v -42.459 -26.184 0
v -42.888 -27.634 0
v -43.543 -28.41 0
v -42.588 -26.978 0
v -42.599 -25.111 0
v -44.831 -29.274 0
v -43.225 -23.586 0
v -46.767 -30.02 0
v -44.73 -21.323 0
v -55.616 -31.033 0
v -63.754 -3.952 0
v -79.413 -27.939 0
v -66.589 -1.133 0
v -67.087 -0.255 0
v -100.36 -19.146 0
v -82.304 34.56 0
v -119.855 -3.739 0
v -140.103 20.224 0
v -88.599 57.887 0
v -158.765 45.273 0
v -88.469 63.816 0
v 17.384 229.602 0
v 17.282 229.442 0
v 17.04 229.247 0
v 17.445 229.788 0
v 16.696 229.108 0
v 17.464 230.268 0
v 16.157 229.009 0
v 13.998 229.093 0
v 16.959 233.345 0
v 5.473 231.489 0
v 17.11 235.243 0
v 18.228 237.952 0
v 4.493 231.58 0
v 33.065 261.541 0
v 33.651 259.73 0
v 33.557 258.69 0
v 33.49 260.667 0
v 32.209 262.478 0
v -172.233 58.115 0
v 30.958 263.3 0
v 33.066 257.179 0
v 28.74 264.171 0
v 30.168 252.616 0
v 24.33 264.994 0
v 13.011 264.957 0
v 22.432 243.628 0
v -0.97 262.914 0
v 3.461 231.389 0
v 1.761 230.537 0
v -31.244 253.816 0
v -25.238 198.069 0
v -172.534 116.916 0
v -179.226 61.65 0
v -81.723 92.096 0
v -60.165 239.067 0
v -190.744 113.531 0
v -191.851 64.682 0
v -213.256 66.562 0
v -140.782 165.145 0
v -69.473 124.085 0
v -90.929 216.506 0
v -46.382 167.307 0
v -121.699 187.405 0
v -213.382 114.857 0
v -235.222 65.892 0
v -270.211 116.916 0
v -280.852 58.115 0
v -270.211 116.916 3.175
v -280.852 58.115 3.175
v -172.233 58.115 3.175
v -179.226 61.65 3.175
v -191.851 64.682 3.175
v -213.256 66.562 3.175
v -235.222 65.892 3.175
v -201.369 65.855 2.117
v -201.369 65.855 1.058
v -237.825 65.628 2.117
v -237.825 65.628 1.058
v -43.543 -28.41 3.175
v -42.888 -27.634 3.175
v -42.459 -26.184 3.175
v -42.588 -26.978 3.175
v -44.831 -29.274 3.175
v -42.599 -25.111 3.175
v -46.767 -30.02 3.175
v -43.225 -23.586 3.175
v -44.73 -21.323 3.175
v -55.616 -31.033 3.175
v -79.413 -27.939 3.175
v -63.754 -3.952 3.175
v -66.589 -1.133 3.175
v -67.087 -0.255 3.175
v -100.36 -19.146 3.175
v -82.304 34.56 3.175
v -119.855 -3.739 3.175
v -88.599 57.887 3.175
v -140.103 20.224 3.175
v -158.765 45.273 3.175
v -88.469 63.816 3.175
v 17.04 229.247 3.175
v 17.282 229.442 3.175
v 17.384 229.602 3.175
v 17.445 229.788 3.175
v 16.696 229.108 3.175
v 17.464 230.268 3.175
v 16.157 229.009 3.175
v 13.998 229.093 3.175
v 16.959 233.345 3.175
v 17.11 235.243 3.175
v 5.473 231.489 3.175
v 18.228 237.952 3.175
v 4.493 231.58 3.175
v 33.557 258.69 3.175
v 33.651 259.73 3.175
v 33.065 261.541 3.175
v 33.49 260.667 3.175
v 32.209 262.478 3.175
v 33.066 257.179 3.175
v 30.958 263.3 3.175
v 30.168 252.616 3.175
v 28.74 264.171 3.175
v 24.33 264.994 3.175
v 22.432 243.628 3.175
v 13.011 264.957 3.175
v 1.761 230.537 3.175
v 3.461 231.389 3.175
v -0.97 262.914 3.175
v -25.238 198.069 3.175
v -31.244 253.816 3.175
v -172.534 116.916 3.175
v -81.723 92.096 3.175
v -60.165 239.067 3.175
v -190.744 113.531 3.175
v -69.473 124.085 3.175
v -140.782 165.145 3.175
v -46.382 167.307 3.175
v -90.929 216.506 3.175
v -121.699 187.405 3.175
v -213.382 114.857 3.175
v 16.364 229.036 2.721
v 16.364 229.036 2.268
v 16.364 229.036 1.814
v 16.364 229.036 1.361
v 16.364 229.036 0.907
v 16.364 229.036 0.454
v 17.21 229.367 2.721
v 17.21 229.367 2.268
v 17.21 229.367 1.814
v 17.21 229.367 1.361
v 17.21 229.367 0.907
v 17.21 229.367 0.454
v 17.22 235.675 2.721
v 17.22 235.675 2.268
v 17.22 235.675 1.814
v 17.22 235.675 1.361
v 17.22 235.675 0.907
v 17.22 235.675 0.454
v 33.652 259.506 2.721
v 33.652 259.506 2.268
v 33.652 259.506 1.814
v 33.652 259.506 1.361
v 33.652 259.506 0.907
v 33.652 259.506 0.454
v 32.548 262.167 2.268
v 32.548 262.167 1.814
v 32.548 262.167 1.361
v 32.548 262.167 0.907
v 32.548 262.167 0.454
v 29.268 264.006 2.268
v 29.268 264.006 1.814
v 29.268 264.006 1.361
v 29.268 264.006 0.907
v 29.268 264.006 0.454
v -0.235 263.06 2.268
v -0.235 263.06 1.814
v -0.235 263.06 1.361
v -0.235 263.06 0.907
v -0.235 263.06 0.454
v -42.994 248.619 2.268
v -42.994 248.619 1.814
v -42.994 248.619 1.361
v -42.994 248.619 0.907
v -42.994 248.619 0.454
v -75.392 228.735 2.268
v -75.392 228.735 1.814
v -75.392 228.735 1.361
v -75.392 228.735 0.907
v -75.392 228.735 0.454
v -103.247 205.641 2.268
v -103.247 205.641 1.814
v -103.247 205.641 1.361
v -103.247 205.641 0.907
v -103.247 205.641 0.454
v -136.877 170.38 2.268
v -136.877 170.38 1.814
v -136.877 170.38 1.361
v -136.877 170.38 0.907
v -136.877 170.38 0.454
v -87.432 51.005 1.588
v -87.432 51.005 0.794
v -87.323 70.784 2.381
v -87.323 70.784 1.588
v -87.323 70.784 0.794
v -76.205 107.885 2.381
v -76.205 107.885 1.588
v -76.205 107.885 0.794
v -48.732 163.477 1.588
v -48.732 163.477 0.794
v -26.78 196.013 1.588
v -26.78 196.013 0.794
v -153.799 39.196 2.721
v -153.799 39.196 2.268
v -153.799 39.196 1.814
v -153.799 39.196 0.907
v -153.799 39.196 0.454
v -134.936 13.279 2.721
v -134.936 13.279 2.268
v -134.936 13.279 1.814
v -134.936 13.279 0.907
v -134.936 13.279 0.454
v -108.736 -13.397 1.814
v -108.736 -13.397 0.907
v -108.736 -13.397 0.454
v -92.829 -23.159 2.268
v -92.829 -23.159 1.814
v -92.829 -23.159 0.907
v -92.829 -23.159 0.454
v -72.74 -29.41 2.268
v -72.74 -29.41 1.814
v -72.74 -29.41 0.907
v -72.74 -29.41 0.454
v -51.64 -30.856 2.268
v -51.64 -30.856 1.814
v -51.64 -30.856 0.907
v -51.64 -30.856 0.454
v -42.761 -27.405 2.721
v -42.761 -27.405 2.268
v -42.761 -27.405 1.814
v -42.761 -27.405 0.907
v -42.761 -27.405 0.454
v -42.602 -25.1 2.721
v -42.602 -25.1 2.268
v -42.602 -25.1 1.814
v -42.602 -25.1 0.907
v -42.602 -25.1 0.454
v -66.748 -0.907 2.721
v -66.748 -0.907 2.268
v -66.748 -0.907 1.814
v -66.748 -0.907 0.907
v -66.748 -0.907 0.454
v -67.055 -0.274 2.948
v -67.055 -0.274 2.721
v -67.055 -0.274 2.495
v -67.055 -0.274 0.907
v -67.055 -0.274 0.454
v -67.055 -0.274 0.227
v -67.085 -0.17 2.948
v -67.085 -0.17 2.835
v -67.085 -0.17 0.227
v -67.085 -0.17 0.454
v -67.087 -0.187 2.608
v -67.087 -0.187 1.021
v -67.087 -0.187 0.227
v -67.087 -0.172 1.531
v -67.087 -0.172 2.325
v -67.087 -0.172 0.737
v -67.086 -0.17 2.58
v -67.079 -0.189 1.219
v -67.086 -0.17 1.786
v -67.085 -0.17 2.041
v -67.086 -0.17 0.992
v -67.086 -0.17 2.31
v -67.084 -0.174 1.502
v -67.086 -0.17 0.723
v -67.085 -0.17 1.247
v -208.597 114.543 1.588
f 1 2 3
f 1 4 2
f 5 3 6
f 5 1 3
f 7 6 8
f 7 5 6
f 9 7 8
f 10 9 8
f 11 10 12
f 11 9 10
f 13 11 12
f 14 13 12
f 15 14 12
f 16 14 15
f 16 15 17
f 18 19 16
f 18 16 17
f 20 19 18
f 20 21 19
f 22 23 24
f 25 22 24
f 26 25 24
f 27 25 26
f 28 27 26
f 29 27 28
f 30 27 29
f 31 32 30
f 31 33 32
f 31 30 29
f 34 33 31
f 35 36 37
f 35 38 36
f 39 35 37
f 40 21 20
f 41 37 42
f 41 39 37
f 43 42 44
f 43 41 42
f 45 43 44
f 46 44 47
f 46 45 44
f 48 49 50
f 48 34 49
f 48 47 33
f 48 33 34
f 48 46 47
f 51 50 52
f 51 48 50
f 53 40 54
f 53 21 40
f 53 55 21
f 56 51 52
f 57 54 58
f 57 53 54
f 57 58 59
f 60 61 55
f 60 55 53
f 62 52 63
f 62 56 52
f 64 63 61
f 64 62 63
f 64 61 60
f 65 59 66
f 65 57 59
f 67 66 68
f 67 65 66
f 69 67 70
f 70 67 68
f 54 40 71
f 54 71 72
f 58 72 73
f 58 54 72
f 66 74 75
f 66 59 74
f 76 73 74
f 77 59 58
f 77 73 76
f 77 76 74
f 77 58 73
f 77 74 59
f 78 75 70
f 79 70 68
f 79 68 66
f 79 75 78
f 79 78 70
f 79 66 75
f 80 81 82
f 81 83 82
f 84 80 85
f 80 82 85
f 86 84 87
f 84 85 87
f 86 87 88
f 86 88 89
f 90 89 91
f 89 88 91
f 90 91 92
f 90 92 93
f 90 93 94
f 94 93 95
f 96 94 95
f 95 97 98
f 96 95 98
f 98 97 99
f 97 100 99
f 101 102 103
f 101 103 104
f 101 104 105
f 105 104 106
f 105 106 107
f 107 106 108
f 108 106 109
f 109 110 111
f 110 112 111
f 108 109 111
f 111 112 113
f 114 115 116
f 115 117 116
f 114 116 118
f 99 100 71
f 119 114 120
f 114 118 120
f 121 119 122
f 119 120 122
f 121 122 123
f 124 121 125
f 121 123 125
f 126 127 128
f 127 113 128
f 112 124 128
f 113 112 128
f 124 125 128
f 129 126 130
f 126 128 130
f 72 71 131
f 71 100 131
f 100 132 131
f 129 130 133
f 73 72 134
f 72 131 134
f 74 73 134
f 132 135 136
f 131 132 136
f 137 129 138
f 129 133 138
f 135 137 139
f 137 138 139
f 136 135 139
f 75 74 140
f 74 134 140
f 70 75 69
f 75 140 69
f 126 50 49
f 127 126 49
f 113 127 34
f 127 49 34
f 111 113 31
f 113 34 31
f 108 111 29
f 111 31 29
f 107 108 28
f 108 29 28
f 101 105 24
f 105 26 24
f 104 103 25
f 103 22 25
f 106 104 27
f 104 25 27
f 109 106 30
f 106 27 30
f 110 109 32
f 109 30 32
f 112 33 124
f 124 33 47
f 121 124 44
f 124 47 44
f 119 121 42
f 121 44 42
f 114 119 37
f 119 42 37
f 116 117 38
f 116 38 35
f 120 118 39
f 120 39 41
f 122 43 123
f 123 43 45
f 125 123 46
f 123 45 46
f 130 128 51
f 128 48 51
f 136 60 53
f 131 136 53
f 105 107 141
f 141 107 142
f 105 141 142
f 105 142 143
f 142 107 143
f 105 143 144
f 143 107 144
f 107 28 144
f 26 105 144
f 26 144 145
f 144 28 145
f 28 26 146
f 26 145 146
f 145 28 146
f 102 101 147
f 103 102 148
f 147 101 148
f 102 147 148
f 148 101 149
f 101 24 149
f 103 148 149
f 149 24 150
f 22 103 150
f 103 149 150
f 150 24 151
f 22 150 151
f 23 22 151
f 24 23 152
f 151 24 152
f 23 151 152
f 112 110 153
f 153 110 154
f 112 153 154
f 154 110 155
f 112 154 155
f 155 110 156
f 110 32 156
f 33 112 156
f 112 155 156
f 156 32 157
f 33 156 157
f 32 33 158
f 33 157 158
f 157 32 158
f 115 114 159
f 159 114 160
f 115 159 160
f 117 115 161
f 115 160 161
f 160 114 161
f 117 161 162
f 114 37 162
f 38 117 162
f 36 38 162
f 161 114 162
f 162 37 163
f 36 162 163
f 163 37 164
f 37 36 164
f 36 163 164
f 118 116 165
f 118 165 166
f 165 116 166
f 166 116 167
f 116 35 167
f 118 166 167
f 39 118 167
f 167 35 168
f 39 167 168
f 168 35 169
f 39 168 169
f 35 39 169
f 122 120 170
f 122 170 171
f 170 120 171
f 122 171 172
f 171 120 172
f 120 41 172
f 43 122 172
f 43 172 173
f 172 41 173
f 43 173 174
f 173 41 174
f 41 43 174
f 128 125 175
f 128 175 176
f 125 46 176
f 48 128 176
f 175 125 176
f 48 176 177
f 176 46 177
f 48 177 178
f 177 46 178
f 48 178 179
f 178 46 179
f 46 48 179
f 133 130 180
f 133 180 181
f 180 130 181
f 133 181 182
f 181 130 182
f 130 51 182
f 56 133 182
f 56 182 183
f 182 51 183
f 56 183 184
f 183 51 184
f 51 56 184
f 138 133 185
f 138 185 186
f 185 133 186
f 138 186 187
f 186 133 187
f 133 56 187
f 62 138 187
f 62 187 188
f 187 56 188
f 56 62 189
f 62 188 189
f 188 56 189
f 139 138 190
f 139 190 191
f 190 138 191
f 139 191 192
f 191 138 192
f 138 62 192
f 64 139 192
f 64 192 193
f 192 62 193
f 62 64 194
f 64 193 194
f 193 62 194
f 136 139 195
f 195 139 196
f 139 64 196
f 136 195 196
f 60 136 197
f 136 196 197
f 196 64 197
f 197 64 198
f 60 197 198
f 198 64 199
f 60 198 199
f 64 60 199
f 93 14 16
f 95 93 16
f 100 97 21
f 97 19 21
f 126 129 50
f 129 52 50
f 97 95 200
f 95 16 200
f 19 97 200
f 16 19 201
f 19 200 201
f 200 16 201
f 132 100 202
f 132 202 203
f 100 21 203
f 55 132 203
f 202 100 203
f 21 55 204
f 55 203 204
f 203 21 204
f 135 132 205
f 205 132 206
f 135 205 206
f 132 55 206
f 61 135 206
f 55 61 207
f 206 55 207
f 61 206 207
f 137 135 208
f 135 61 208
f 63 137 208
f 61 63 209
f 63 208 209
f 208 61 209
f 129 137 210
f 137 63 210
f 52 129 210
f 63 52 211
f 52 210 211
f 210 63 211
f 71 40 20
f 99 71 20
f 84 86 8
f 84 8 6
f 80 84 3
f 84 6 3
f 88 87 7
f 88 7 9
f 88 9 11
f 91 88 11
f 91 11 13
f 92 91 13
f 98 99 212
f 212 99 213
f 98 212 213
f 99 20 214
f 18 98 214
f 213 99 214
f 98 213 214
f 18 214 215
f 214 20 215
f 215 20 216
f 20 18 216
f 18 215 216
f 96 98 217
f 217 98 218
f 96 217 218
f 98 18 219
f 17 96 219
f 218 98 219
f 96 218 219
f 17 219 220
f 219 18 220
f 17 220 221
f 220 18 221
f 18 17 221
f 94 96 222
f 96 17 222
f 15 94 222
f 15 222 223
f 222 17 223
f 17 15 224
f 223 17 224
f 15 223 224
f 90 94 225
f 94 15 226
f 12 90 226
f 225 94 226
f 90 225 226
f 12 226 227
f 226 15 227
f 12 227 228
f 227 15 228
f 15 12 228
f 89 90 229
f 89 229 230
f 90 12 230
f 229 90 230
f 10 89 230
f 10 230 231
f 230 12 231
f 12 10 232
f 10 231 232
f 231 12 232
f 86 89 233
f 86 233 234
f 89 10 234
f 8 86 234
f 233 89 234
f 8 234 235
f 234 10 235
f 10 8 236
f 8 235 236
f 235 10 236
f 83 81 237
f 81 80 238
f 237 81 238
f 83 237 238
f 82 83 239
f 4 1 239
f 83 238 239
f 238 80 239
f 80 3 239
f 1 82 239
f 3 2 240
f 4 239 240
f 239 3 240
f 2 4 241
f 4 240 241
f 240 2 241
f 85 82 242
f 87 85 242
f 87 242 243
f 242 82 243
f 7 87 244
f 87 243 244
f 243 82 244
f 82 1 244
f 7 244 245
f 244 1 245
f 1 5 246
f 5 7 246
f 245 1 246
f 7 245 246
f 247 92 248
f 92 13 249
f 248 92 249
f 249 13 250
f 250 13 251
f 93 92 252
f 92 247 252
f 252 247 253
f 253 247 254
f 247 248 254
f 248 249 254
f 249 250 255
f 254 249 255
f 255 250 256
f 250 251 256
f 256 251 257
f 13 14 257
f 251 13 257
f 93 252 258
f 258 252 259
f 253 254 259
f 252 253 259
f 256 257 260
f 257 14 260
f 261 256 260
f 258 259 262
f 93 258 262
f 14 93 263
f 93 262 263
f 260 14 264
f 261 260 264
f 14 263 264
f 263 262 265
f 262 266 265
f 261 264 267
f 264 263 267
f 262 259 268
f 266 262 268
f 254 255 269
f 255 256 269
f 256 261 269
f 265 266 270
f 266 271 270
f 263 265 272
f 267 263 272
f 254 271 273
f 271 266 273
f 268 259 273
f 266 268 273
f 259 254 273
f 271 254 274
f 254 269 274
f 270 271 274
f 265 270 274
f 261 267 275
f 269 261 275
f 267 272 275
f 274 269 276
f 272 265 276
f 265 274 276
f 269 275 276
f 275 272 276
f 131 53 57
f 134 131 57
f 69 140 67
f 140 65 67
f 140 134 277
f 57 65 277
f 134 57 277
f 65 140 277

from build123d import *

# Parameters (mm, degrees)
F1_DEPTH = 3.175


with BuildPart() as f1:
    # F0 (on Top) → F1 (new body)
    with BuildSketch(Plane.XY):
        with BuildLine():
            add(Edge.make_bspline(
                [(-172.2328667043, 58.114699061), (-178.1991780072, 62.5826207553), (-202.4796362473, 67.2126055062), (-240.970937826, 66.6028247051), (-259.3255736371, 61.8181466399), (-280.8515687991, 58.114699061)],
                knots=[0, 0, 0, 0, 0.3027206265, 0.6356225974, 1, 1, 1, 1], degree=3))
            add(Edge.make_bspline(
                [(-172.2328667043, 58.114699061), (-167.7932428049, 55.103638933), (-153.8662998203, 41.1431396594), (-135.8069266298, 12.4939209918), (-110.0012521127, -14.9557776444), (-78.8693403249, -31.6914411152), (-23.4339486691, -32.3119024273), (-67.2976555796, -2.7103102349), (-67.0868525894, 0), (-67.0868525894, -0.2549805823)],
                knots=[0, 0, 0, 0, 0.1360657028, 0.3037302143, 0.4742693474, 0.653482802, 0.809369367, 0.9757911433, 1, 1, 1, 1], degree=3))
            add(Edge.make_bspline(
                [(-67.0868525894, -0.2549805823), (-69.2125904029, 3.256175837), (-74.9921898873, 14.4848800684), (-89.27520538, 52.310380297), (-88.7591205811, 74.5924149335), (-62.9272192884, 159.5779075452), (1.7608600929, 230.5372072262)],
                knots=[0, 0, 0, 0, 0.1439204339, 0.3645296562, 0.5199668986, 1, 1, 1, 1], degree=3))
            add(Edge.make_bspline(
                [(1.7608600929, 230.5372072262), (4.560167842, 232.3477854591), (6.9918636567, 230.3656272234), (20.2924394563, 227.4759853141), (12.3864605446, 237.3715301092), (57.8638928697, 271.815718132), (-57.3918104099, 261.8348224849), (-155.2239797379, 150.0208747529), (-135.8220126113, 170.3795203176), (-172.5344332528, 116.915699061)],
                knots=[0, 0, 0, 0, 0.0612977045, 0.1343370941, 0.1950509223, 0.3256865314, 0.5386004436, 0.806055147, 1, 1, 1, 1], degree=3))
            add(Edge.make_bspline(
                [(-172.5344332528, 116.915699061), (-189.9868586916, 111.6945158446), (-209.5622546066, 116.3198478282), (-237.8254445073, 114.7618445941), (-270.2109416491, 116.915699061)],
                knots=[0, 0, 0, 0, 0.4336162916, 1, 1, 1, 1], degree=3))
            Line((-270.2109416491, 116.915699061), (-280.8515687991, 58.114699061))
        make_face()
    extrude(amount=F1_DEPTH)


solid = f1.part
